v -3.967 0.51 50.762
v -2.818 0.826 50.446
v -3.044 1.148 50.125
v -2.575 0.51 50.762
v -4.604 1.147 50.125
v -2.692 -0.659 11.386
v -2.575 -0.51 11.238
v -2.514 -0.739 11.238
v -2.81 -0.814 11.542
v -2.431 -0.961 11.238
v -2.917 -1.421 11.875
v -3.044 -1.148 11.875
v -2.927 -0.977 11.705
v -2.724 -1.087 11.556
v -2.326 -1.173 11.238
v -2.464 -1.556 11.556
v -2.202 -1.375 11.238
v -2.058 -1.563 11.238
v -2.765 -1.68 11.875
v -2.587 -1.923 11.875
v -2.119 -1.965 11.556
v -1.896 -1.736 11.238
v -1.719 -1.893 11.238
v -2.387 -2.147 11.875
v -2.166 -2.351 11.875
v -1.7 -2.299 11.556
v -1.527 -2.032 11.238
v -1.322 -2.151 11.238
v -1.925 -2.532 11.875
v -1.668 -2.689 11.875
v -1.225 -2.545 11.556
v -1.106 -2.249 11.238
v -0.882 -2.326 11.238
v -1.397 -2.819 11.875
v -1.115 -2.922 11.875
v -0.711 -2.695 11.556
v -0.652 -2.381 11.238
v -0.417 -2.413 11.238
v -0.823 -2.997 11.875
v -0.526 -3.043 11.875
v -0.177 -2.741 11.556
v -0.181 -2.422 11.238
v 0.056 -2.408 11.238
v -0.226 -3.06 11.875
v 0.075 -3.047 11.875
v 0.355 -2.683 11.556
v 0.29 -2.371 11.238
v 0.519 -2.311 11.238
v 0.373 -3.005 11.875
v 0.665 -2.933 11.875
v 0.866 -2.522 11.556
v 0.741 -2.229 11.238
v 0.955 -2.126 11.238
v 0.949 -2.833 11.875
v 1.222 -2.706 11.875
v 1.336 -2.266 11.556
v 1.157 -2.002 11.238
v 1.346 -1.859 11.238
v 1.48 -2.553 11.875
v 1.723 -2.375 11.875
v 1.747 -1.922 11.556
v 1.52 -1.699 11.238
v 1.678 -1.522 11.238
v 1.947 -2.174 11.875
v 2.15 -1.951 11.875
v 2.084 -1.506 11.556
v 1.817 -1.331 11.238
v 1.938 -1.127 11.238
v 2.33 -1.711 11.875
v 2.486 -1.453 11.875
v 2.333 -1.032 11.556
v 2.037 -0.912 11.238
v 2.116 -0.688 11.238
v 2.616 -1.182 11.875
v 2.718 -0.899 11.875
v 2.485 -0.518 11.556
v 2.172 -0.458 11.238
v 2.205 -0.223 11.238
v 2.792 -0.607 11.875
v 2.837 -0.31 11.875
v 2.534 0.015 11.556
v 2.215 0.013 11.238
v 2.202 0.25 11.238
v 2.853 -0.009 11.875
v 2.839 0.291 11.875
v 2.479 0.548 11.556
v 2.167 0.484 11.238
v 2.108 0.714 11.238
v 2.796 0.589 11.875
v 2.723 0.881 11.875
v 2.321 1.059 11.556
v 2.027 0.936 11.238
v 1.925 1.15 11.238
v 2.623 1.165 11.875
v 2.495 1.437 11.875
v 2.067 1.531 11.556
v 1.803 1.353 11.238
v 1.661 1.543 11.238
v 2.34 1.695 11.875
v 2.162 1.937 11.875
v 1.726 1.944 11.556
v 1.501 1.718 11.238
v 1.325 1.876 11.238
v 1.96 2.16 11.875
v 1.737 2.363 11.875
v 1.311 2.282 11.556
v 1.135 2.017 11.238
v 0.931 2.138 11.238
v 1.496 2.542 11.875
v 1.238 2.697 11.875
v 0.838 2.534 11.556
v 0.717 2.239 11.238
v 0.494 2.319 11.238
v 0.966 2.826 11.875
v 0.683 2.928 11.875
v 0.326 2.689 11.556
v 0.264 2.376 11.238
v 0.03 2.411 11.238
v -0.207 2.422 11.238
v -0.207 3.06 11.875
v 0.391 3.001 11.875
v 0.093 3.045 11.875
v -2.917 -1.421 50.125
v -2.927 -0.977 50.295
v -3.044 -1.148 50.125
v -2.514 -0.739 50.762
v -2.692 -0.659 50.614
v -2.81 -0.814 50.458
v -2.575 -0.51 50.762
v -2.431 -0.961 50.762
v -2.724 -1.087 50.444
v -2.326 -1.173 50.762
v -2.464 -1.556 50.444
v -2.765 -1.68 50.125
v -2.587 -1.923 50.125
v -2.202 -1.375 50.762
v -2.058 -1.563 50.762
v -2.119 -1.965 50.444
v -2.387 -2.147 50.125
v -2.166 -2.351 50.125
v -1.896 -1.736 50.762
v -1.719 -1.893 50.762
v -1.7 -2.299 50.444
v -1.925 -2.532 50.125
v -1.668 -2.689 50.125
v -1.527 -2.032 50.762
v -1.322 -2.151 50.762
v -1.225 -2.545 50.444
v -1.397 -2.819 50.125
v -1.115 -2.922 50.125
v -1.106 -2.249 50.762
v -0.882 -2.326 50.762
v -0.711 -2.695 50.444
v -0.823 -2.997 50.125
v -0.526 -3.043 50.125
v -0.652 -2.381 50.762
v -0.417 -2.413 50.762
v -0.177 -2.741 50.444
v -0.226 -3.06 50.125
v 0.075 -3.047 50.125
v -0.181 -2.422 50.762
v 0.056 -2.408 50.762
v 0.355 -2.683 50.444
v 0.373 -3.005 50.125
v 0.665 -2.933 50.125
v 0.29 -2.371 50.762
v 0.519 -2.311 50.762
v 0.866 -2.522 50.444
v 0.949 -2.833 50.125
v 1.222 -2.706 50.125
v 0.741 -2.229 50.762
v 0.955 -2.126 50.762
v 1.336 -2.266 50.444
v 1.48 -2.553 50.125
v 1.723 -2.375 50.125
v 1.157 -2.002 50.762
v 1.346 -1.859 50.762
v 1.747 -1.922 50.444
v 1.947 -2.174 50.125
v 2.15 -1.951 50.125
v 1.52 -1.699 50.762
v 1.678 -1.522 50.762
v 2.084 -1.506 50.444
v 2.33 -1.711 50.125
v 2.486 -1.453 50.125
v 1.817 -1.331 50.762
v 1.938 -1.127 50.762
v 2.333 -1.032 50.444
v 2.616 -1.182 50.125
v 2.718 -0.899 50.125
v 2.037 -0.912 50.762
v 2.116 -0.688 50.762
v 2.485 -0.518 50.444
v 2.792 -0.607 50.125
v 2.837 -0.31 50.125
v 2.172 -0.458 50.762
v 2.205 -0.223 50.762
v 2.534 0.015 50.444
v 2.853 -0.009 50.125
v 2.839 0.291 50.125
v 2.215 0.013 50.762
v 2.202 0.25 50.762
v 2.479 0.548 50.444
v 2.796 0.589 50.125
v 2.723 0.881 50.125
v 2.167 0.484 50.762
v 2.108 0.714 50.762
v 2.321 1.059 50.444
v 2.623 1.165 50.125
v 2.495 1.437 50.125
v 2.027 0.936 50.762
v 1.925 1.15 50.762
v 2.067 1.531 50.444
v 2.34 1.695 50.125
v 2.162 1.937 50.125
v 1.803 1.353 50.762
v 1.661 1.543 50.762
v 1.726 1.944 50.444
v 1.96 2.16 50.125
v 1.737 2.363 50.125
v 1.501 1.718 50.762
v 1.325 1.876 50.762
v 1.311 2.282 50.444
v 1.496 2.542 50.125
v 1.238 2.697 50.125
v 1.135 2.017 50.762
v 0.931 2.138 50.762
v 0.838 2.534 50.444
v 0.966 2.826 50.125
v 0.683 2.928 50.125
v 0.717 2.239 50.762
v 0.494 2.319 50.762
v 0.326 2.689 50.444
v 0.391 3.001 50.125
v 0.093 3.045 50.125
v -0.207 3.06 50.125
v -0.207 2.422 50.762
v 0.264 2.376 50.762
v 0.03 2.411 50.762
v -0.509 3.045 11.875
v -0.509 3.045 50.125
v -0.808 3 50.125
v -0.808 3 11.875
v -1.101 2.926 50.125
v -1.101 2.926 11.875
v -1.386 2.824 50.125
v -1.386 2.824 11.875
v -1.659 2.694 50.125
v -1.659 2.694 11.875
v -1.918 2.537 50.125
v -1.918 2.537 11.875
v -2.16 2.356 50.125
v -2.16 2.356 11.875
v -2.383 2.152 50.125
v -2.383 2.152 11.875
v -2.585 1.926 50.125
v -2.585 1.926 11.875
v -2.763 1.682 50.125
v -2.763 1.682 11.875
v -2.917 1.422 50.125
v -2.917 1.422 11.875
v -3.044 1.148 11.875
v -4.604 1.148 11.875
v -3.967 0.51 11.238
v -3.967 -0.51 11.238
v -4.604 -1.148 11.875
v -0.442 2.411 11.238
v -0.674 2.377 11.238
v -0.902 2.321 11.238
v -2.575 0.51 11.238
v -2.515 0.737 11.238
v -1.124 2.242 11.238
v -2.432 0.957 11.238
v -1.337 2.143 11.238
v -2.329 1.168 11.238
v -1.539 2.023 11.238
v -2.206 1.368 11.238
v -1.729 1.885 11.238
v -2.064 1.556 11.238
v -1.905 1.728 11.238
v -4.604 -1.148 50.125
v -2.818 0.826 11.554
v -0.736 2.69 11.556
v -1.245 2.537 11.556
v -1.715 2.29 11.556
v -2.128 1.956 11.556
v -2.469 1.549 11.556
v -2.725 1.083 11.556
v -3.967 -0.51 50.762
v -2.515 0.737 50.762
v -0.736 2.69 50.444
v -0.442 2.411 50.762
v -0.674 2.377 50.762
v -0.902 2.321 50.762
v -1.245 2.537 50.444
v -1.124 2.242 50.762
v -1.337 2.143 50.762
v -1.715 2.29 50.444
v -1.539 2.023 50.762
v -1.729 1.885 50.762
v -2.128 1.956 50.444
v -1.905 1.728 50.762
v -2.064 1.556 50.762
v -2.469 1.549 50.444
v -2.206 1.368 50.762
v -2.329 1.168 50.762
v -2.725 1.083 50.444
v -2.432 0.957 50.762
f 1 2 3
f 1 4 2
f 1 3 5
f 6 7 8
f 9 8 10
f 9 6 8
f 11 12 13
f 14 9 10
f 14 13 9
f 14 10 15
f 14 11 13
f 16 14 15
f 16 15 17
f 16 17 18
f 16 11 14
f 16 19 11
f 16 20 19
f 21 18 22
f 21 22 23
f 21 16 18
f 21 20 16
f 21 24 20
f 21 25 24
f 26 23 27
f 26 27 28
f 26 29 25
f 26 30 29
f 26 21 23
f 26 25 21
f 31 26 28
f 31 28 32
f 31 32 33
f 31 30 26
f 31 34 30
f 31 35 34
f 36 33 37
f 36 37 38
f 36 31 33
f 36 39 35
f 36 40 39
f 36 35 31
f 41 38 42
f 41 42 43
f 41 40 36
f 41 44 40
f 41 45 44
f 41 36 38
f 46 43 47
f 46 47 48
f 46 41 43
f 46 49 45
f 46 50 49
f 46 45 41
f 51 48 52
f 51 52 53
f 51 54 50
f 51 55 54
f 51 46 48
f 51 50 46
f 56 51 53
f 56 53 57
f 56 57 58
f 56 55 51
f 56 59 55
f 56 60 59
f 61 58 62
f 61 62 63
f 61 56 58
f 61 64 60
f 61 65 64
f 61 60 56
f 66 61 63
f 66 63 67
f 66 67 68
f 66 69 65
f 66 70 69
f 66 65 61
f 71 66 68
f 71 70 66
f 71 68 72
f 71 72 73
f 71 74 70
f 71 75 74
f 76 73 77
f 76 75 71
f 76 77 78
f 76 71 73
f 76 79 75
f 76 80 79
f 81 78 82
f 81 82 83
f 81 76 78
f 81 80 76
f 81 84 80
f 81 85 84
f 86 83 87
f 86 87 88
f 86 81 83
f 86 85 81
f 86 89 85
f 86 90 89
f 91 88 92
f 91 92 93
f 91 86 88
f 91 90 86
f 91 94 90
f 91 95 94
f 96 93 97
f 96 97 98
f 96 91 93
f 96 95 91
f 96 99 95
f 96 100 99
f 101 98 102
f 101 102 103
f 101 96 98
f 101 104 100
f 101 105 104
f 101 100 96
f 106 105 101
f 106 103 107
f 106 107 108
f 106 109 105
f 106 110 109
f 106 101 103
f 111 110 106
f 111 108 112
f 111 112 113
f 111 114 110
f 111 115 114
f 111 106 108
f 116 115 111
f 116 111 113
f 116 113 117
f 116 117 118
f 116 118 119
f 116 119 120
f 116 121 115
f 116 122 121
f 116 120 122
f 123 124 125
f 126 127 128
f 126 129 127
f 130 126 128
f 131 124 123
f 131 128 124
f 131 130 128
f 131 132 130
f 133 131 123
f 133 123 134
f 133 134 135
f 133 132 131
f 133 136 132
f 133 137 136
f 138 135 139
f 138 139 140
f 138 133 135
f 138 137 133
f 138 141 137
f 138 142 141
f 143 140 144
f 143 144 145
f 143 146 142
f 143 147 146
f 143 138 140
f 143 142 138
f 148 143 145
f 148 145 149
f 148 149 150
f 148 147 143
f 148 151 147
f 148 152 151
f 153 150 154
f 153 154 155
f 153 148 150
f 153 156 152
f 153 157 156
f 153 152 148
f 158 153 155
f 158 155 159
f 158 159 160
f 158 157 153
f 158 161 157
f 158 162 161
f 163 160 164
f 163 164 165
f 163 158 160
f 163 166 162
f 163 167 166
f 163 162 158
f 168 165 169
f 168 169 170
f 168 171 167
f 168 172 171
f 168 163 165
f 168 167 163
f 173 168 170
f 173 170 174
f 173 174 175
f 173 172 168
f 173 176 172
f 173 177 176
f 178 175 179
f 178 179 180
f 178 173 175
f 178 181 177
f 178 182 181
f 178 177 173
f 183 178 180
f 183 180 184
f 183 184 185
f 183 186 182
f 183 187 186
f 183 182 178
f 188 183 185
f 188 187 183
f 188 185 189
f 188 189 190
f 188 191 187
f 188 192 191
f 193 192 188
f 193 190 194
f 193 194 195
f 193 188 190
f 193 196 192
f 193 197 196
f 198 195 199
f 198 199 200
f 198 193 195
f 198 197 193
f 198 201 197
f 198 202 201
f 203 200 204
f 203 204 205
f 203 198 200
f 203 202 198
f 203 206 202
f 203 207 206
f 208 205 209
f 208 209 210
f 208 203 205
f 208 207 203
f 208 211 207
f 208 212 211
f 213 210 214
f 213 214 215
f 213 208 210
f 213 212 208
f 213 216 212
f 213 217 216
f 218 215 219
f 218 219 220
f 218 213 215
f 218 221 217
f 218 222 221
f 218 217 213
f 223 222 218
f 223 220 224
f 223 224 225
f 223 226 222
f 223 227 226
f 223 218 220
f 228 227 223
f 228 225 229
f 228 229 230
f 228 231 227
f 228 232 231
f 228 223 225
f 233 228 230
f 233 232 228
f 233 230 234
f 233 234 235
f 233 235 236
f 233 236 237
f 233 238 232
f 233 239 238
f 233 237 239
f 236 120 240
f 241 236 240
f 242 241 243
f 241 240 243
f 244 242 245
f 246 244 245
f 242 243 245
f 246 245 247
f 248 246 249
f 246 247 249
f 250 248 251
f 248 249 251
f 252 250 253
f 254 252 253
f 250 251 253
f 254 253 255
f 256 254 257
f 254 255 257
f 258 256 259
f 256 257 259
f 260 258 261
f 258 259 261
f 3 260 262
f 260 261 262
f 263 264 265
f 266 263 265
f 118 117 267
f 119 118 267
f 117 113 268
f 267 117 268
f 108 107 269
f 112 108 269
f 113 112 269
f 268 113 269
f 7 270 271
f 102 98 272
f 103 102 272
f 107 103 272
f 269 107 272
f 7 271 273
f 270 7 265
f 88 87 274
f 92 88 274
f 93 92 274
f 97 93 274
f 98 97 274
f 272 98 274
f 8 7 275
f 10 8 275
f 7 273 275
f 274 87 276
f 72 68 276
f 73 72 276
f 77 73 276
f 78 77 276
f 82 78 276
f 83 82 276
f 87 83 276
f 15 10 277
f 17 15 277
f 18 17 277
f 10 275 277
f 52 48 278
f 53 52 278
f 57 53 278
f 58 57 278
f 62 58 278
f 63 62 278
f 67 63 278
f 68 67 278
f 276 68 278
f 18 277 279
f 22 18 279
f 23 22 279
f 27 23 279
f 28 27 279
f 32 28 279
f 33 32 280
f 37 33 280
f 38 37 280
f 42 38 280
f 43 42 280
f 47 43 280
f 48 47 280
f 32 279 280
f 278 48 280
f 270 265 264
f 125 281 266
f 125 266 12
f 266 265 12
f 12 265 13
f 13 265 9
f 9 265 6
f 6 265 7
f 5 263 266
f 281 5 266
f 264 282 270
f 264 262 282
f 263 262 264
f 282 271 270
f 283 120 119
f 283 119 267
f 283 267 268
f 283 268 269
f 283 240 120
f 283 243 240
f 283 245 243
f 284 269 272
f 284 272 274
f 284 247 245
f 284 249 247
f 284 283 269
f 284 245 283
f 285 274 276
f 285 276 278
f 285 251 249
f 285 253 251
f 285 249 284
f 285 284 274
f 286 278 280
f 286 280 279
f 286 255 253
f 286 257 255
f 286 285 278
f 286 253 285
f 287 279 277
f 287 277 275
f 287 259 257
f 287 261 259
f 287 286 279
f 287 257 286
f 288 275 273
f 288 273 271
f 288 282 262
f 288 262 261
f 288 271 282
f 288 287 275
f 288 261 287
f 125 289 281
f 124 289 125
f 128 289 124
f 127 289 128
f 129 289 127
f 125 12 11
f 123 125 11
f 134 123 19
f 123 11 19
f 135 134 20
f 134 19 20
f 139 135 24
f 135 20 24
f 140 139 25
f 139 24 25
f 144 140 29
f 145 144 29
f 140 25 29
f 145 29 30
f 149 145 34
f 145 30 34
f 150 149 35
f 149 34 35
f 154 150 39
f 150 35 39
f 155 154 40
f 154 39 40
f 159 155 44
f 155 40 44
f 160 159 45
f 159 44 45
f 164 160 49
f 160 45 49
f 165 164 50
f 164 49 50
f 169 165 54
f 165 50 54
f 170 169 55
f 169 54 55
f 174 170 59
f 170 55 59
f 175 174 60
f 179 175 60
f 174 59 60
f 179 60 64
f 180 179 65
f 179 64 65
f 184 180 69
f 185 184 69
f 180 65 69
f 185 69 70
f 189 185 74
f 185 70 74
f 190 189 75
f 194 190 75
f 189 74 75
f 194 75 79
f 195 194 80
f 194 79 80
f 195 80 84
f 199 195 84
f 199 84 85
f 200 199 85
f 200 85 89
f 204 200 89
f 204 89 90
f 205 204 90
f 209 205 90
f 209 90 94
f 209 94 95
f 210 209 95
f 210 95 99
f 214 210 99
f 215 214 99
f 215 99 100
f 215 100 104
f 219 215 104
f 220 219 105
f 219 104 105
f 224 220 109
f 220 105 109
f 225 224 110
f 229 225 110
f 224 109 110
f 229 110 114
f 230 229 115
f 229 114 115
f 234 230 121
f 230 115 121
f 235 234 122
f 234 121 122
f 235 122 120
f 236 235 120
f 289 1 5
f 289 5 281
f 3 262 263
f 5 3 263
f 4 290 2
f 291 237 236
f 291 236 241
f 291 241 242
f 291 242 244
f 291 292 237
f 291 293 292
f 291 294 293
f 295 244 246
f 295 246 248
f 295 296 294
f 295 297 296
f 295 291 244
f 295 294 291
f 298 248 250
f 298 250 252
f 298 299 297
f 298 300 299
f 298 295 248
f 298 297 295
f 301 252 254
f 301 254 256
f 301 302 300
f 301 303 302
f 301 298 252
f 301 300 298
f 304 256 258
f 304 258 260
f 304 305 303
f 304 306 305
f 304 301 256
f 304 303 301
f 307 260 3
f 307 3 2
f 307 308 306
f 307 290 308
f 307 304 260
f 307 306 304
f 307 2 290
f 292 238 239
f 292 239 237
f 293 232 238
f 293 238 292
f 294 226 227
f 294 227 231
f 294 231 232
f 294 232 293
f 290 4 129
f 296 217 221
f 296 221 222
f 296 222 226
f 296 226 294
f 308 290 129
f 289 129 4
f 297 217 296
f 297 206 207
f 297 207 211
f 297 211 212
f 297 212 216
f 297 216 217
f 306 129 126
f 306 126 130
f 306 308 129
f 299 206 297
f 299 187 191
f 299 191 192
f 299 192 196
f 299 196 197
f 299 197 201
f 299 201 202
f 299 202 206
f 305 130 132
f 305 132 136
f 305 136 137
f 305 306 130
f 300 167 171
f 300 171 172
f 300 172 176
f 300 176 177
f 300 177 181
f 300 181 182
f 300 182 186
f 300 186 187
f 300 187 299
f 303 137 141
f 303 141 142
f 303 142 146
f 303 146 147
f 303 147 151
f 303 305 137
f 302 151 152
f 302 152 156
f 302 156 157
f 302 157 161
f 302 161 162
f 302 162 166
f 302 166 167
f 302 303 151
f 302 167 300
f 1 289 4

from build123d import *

# Parameters (mm, degrees)
BOSS_EXTRUDE1_DEPTH = 62
CHAMFER1_SIZE       = 1
CHAMFER2_SIZE       = 1
SCALE1_SCALE        = 0.75
SCALE2_SCALE        = 0.85


with BuildPart() as part:
    # Sketch1 → Boss-Extrude1 (new body)
    with BuildSketch(Plane(origin=(0, 0, 0), x_dir=(0, 1, 0), z_dir=(0, 0, 1))):
        with BuildLine():
            Line((1.8, 6.897570975), (-1.8, 6.897570975))
            Line((-1.8, 6.897570975), (-1.8, 4.449719092))
            ThreePointArc((-1.8, 4.449719092), (0, 4.8), (1.8, 4.449719092))
            Line((1.8, 4.449719092), (1.8, 6.897570975))
        make_face()
        with BuildLine():
            ThreePointArc((1.8, 4.449719092), (0, 4.8), (-1.8, 4.449719092))
            Line((-1.8, 4.449719092), (-1.8, 1.697570975))
            Line((-1.8, 1.697570975), (1.8, 1.697570975))
            Line((1.8, 1.697570975), (1.8, 4.449719092))
        make_face()
        with BuildLine():
            Line((-1.8, 1.697570975), (-1.8, 4.449719092))
            ThreePointArc((-1.8, 4.449719092), (-2.683281573, -3.979949748), (4.8, 0))
            ThreePointArc((4.8, 0), (3.979949748, 2.683281573), (1.8, 4.449719092))
            Line((1.8, 4.449719092), (1.8, 1.697570975))
            Line((1.8, 1.697570975), (-1.8, 1.697570975))
        make_face()
    extrude(amount=BOSS_EXTRUDE1_DEPTH)

    # Chamfer1
    chamfer1_edges = [part.edges().sort_by_distance(p)[0] for p in [
        (3.979949748, -2.683281573, 62),
        (-5.673645034, 1.8, 62),
        (-6.897570975, 0, 62),
        (-5.673645034, -1.8, 62),
    ]]
    chamfer(chamfer1_edges, length=CHAMFER1_SIZE)

    # Chamfer2
    chamfer2_edges = [part.edges().sort_by_distance(p)[0] for p in [
        (-6.897570975, 0, 0),
        (-5.673645034, 1.8, 0),
        (3.979949748, -2.683281573, 0),
        (-5.673645034, -1.8, 0),
    ]]
    chamfer(chamfer2_edges, length=CHAMFER2_SIZE)


with BuildPart() as part_1:
    # Scale1: scaled about (-0.57130559, 0, 31)
    add(part.part.scale(SCALE1_SCALE).moved(Location((-0.142826398, 0, 7.75))))


with BuildPart() as part_2:
    # Scale2: scaled about (-0.57130559, 0, 31)
    add(part_1.part.scale(SCALE2_SCALE).moved(Location((-0.085695839, 0, 4.65))))


solid = part_2.part
